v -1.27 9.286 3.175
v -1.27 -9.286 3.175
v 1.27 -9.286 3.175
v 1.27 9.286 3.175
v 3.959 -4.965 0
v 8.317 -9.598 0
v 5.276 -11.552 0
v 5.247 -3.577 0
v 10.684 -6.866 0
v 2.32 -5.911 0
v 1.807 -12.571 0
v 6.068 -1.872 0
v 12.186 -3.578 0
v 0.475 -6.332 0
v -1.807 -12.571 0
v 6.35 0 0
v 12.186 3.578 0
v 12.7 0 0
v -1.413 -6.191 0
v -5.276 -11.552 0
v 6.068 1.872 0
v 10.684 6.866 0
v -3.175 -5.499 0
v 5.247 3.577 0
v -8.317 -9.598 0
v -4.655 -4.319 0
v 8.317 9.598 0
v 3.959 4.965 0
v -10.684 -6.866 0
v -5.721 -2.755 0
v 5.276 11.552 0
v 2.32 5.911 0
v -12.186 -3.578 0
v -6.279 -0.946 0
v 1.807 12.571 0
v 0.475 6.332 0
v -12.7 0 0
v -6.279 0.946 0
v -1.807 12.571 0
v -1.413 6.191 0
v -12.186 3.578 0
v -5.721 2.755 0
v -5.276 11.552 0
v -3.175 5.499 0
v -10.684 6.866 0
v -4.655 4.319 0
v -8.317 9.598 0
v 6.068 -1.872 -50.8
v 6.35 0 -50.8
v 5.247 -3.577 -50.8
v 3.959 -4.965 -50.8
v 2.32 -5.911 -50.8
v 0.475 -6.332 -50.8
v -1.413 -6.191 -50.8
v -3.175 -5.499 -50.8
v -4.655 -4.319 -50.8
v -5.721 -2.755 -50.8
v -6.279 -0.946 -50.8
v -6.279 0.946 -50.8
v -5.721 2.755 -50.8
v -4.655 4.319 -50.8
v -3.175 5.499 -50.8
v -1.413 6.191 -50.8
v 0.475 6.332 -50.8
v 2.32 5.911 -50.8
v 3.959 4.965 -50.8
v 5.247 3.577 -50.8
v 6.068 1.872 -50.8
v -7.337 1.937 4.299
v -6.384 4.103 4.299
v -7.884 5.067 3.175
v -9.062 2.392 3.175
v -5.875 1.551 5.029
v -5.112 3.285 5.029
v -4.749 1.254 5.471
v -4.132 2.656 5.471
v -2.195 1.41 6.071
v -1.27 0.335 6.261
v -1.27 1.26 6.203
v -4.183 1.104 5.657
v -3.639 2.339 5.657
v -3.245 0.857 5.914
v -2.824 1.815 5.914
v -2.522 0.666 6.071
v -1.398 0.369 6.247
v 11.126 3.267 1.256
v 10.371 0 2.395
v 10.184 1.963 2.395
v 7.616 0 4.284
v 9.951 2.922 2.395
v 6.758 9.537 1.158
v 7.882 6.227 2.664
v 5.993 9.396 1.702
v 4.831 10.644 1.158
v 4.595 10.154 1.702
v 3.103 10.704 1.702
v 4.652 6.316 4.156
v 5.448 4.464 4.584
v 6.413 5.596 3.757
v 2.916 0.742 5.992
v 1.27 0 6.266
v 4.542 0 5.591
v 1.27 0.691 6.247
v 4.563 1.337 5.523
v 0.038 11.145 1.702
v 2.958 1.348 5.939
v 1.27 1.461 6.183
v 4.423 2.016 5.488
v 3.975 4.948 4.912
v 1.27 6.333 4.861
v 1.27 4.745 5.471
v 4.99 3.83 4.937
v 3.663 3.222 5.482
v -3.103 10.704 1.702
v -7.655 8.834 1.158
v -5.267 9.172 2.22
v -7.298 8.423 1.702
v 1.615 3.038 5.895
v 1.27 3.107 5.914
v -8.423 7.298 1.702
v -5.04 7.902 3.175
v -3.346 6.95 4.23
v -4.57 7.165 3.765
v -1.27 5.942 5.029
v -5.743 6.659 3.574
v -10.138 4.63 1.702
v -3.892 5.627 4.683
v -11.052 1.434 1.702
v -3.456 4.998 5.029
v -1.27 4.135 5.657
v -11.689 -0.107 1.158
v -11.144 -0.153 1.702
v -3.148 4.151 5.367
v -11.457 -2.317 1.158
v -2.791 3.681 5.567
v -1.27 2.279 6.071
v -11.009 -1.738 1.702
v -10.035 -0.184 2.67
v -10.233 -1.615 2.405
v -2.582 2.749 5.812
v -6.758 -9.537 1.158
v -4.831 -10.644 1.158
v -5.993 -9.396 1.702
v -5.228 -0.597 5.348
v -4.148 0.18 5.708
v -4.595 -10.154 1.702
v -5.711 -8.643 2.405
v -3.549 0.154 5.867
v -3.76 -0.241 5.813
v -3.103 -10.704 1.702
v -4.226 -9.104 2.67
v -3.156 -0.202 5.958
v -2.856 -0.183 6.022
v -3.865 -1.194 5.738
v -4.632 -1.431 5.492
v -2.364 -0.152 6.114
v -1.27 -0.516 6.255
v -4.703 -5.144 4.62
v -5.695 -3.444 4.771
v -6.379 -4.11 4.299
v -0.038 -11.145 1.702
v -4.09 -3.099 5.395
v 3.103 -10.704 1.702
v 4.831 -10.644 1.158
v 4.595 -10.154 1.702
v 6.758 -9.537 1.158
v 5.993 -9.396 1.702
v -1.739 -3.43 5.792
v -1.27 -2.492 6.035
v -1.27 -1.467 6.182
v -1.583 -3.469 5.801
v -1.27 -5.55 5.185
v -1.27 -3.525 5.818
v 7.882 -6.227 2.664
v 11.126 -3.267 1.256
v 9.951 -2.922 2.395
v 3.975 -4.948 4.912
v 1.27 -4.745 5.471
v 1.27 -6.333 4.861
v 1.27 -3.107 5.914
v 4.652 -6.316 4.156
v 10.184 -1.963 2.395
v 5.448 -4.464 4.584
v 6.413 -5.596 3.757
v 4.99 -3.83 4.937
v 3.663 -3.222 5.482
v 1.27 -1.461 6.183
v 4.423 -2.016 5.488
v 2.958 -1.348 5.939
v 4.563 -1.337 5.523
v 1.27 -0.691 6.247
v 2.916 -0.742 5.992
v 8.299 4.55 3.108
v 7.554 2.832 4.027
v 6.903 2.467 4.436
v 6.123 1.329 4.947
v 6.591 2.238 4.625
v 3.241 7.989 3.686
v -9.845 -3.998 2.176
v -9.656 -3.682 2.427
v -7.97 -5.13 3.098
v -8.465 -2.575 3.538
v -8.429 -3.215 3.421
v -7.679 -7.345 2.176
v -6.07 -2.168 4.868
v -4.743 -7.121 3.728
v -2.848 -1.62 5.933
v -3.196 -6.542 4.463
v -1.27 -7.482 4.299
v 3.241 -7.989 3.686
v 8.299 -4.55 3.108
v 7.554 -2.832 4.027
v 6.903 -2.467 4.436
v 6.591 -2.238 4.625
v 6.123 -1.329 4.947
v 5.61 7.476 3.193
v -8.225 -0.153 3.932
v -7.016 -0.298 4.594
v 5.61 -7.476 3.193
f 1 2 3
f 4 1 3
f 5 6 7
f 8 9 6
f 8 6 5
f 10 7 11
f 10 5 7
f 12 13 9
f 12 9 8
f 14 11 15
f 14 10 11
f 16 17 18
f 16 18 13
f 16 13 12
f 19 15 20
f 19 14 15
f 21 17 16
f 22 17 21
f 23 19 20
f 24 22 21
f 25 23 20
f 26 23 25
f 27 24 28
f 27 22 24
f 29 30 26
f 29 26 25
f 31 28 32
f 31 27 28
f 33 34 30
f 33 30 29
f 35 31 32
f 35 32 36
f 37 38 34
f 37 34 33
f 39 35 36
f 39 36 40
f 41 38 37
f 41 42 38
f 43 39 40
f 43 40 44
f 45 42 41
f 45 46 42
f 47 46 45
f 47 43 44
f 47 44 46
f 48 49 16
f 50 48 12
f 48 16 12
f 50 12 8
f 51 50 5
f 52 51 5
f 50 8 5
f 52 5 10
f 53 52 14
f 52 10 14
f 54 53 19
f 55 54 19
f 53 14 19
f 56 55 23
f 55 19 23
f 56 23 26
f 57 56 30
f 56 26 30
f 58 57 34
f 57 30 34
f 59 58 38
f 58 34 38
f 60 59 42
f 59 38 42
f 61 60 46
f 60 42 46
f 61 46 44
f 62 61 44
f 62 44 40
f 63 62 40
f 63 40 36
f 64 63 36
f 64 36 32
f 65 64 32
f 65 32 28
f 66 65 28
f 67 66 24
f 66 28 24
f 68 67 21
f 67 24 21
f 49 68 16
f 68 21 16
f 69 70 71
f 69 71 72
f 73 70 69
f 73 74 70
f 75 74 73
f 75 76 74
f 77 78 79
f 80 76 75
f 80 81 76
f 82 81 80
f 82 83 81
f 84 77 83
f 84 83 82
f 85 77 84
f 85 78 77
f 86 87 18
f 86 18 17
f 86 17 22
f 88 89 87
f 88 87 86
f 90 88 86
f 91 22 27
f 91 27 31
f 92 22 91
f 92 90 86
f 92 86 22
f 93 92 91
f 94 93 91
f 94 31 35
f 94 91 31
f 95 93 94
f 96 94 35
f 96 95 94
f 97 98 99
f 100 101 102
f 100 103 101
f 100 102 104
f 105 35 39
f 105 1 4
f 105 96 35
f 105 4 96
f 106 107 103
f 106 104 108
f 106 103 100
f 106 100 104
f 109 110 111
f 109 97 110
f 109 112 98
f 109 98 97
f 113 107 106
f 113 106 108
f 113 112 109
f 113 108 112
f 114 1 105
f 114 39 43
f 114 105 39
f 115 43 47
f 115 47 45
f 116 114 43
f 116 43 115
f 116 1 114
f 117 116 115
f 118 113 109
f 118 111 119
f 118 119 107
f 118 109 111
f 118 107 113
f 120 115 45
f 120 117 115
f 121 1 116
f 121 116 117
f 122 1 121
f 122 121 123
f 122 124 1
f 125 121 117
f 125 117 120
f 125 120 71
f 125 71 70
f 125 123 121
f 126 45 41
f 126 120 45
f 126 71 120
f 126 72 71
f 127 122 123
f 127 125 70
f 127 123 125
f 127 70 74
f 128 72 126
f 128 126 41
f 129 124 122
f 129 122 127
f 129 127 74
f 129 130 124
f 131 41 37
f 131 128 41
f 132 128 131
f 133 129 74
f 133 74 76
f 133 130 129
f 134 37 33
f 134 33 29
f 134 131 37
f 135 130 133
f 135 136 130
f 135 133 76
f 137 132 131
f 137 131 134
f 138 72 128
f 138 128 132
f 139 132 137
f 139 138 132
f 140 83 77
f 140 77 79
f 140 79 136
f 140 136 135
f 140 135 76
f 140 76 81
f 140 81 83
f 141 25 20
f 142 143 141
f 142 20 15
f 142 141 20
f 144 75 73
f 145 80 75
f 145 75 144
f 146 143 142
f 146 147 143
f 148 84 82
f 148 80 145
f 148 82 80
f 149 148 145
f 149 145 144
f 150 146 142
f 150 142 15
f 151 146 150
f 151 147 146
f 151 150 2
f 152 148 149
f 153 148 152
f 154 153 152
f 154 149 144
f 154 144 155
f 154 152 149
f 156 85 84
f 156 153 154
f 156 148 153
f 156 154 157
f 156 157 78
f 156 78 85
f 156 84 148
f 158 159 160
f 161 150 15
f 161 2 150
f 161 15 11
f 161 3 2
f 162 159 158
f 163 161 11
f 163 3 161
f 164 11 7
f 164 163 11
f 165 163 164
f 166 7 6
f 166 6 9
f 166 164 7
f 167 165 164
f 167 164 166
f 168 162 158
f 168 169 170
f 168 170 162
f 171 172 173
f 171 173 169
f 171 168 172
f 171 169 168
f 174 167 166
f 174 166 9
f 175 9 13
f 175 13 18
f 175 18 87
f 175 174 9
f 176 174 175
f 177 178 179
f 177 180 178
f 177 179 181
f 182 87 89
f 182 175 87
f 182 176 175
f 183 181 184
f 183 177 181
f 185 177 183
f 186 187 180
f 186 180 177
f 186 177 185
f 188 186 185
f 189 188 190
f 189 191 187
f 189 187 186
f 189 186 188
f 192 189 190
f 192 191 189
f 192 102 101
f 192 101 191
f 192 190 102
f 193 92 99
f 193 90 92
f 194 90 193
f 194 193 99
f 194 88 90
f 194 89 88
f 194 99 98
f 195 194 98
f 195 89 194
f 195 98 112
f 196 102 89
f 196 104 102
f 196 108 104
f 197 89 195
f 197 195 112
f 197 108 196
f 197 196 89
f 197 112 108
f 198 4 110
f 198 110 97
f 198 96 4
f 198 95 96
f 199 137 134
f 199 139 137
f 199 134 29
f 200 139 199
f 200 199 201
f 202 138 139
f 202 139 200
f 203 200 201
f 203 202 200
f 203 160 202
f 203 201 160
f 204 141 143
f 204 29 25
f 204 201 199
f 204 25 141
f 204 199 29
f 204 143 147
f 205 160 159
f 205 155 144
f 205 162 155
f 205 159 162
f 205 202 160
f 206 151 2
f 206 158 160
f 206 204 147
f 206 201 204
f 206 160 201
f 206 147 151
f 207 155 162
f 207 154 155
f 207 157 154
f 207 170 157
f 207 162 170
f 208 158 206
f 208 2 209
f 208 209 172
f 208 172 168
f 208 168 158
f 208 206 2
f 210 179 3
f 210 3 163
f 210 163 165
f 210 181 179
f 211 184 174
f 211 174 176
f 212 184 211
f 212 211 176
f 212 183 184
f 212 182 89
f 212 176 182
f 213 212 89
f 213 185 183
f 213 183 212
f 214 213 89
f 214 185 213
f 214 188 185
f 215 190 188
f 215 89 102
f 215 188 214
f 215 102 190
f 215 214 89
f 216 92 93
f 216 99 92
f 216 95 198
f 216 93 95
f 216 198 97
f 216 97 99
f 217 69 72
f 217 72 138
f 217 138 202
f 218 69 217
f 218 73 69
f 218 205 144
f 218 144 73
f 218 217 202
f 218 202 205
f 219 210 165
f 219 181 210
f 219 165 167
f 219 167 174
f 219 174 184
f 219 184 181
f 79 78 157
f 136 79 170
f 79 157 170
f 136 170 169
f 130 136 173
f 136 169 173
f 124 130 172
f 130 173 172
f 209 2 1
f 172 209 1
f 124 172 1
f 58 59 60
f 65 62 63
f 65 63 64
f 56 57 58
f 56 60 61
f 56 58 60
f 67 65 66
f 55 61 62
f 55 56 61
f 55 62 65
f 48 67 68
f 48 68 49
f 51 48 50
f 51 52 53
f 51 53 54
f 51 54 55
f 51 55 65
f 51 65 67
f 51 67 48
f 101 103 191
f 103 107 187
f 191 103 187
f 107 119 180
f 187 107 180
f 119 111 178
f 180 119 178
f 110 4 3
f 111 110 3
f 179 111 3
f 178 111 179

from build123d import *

# Parameters (mm, degrees)
F2_DEPTH = 12.7
F3_R     = 6.35
F4_DEPTH = 50.8


with BuildPart() as f1:
    # F0 (on Front) → F1 (revolve)
    with BuildSketch(Plane.XZ):
        with BuildLine():
            Line((0, 3.175), (0, 0))
            Line((0, 0), (12.7, 0))
            ThreePointArc((12.7, 0), (7.6159171285, 4.2838145072), (1.27, 6.2658087489))
            Line((1.27, 6.2658087489), (1.27, 3.175))
            Line((1.27, 3.175), (0, 3.175))
        make_face()
    revolve(axis=Axis((0, 0, 3.175), (0, 0, 1)))

    # F0 (on Front) → F2 (cut, symmetric)
    with BuildSketch(Plane.XZ):
        with BuildLine():
            Line((-1.27, 3.175), (0, 3.175))
            Line((0, 3.175), (0, 6.35))
            ThreePointArc((0, 6.35), (0.6357958012, 6.3199087984), (1.27, 6.2658087489))
            Line((1.27, 6.2658087489), (1.27, 9.525))
            Line((1.27, 9.525), (-1.27, 9.525))
            Line((-1.27, 9.525), (-1.27, 3.175))
        make_face()
        with BuildLine():
            Line((0, 6.35), (0, 3.175))
            Line((0, 3.175), (1.27, 3.175))
            Line((1.27, 3.175), (1.27, 6.2658087489))
            ThreePointArc((1.27, 6.2658087489), (0.6357958012, 6.3199087984), (0, 6.35))
        make_face()
    extrude(amount=F2_DEPTH, both=True, mode=Mode.SUBTRACT)

    # F3 (on face) → F4 (join)
    with BuildSketch(Plane(origin=(0, 0, 0), x_dir=(1, 0, 0), z_dir=(0, 0, -1))):
        Circle(F3_R)
    extrude(amount=F4_DEPTH)


solid = f1.part
